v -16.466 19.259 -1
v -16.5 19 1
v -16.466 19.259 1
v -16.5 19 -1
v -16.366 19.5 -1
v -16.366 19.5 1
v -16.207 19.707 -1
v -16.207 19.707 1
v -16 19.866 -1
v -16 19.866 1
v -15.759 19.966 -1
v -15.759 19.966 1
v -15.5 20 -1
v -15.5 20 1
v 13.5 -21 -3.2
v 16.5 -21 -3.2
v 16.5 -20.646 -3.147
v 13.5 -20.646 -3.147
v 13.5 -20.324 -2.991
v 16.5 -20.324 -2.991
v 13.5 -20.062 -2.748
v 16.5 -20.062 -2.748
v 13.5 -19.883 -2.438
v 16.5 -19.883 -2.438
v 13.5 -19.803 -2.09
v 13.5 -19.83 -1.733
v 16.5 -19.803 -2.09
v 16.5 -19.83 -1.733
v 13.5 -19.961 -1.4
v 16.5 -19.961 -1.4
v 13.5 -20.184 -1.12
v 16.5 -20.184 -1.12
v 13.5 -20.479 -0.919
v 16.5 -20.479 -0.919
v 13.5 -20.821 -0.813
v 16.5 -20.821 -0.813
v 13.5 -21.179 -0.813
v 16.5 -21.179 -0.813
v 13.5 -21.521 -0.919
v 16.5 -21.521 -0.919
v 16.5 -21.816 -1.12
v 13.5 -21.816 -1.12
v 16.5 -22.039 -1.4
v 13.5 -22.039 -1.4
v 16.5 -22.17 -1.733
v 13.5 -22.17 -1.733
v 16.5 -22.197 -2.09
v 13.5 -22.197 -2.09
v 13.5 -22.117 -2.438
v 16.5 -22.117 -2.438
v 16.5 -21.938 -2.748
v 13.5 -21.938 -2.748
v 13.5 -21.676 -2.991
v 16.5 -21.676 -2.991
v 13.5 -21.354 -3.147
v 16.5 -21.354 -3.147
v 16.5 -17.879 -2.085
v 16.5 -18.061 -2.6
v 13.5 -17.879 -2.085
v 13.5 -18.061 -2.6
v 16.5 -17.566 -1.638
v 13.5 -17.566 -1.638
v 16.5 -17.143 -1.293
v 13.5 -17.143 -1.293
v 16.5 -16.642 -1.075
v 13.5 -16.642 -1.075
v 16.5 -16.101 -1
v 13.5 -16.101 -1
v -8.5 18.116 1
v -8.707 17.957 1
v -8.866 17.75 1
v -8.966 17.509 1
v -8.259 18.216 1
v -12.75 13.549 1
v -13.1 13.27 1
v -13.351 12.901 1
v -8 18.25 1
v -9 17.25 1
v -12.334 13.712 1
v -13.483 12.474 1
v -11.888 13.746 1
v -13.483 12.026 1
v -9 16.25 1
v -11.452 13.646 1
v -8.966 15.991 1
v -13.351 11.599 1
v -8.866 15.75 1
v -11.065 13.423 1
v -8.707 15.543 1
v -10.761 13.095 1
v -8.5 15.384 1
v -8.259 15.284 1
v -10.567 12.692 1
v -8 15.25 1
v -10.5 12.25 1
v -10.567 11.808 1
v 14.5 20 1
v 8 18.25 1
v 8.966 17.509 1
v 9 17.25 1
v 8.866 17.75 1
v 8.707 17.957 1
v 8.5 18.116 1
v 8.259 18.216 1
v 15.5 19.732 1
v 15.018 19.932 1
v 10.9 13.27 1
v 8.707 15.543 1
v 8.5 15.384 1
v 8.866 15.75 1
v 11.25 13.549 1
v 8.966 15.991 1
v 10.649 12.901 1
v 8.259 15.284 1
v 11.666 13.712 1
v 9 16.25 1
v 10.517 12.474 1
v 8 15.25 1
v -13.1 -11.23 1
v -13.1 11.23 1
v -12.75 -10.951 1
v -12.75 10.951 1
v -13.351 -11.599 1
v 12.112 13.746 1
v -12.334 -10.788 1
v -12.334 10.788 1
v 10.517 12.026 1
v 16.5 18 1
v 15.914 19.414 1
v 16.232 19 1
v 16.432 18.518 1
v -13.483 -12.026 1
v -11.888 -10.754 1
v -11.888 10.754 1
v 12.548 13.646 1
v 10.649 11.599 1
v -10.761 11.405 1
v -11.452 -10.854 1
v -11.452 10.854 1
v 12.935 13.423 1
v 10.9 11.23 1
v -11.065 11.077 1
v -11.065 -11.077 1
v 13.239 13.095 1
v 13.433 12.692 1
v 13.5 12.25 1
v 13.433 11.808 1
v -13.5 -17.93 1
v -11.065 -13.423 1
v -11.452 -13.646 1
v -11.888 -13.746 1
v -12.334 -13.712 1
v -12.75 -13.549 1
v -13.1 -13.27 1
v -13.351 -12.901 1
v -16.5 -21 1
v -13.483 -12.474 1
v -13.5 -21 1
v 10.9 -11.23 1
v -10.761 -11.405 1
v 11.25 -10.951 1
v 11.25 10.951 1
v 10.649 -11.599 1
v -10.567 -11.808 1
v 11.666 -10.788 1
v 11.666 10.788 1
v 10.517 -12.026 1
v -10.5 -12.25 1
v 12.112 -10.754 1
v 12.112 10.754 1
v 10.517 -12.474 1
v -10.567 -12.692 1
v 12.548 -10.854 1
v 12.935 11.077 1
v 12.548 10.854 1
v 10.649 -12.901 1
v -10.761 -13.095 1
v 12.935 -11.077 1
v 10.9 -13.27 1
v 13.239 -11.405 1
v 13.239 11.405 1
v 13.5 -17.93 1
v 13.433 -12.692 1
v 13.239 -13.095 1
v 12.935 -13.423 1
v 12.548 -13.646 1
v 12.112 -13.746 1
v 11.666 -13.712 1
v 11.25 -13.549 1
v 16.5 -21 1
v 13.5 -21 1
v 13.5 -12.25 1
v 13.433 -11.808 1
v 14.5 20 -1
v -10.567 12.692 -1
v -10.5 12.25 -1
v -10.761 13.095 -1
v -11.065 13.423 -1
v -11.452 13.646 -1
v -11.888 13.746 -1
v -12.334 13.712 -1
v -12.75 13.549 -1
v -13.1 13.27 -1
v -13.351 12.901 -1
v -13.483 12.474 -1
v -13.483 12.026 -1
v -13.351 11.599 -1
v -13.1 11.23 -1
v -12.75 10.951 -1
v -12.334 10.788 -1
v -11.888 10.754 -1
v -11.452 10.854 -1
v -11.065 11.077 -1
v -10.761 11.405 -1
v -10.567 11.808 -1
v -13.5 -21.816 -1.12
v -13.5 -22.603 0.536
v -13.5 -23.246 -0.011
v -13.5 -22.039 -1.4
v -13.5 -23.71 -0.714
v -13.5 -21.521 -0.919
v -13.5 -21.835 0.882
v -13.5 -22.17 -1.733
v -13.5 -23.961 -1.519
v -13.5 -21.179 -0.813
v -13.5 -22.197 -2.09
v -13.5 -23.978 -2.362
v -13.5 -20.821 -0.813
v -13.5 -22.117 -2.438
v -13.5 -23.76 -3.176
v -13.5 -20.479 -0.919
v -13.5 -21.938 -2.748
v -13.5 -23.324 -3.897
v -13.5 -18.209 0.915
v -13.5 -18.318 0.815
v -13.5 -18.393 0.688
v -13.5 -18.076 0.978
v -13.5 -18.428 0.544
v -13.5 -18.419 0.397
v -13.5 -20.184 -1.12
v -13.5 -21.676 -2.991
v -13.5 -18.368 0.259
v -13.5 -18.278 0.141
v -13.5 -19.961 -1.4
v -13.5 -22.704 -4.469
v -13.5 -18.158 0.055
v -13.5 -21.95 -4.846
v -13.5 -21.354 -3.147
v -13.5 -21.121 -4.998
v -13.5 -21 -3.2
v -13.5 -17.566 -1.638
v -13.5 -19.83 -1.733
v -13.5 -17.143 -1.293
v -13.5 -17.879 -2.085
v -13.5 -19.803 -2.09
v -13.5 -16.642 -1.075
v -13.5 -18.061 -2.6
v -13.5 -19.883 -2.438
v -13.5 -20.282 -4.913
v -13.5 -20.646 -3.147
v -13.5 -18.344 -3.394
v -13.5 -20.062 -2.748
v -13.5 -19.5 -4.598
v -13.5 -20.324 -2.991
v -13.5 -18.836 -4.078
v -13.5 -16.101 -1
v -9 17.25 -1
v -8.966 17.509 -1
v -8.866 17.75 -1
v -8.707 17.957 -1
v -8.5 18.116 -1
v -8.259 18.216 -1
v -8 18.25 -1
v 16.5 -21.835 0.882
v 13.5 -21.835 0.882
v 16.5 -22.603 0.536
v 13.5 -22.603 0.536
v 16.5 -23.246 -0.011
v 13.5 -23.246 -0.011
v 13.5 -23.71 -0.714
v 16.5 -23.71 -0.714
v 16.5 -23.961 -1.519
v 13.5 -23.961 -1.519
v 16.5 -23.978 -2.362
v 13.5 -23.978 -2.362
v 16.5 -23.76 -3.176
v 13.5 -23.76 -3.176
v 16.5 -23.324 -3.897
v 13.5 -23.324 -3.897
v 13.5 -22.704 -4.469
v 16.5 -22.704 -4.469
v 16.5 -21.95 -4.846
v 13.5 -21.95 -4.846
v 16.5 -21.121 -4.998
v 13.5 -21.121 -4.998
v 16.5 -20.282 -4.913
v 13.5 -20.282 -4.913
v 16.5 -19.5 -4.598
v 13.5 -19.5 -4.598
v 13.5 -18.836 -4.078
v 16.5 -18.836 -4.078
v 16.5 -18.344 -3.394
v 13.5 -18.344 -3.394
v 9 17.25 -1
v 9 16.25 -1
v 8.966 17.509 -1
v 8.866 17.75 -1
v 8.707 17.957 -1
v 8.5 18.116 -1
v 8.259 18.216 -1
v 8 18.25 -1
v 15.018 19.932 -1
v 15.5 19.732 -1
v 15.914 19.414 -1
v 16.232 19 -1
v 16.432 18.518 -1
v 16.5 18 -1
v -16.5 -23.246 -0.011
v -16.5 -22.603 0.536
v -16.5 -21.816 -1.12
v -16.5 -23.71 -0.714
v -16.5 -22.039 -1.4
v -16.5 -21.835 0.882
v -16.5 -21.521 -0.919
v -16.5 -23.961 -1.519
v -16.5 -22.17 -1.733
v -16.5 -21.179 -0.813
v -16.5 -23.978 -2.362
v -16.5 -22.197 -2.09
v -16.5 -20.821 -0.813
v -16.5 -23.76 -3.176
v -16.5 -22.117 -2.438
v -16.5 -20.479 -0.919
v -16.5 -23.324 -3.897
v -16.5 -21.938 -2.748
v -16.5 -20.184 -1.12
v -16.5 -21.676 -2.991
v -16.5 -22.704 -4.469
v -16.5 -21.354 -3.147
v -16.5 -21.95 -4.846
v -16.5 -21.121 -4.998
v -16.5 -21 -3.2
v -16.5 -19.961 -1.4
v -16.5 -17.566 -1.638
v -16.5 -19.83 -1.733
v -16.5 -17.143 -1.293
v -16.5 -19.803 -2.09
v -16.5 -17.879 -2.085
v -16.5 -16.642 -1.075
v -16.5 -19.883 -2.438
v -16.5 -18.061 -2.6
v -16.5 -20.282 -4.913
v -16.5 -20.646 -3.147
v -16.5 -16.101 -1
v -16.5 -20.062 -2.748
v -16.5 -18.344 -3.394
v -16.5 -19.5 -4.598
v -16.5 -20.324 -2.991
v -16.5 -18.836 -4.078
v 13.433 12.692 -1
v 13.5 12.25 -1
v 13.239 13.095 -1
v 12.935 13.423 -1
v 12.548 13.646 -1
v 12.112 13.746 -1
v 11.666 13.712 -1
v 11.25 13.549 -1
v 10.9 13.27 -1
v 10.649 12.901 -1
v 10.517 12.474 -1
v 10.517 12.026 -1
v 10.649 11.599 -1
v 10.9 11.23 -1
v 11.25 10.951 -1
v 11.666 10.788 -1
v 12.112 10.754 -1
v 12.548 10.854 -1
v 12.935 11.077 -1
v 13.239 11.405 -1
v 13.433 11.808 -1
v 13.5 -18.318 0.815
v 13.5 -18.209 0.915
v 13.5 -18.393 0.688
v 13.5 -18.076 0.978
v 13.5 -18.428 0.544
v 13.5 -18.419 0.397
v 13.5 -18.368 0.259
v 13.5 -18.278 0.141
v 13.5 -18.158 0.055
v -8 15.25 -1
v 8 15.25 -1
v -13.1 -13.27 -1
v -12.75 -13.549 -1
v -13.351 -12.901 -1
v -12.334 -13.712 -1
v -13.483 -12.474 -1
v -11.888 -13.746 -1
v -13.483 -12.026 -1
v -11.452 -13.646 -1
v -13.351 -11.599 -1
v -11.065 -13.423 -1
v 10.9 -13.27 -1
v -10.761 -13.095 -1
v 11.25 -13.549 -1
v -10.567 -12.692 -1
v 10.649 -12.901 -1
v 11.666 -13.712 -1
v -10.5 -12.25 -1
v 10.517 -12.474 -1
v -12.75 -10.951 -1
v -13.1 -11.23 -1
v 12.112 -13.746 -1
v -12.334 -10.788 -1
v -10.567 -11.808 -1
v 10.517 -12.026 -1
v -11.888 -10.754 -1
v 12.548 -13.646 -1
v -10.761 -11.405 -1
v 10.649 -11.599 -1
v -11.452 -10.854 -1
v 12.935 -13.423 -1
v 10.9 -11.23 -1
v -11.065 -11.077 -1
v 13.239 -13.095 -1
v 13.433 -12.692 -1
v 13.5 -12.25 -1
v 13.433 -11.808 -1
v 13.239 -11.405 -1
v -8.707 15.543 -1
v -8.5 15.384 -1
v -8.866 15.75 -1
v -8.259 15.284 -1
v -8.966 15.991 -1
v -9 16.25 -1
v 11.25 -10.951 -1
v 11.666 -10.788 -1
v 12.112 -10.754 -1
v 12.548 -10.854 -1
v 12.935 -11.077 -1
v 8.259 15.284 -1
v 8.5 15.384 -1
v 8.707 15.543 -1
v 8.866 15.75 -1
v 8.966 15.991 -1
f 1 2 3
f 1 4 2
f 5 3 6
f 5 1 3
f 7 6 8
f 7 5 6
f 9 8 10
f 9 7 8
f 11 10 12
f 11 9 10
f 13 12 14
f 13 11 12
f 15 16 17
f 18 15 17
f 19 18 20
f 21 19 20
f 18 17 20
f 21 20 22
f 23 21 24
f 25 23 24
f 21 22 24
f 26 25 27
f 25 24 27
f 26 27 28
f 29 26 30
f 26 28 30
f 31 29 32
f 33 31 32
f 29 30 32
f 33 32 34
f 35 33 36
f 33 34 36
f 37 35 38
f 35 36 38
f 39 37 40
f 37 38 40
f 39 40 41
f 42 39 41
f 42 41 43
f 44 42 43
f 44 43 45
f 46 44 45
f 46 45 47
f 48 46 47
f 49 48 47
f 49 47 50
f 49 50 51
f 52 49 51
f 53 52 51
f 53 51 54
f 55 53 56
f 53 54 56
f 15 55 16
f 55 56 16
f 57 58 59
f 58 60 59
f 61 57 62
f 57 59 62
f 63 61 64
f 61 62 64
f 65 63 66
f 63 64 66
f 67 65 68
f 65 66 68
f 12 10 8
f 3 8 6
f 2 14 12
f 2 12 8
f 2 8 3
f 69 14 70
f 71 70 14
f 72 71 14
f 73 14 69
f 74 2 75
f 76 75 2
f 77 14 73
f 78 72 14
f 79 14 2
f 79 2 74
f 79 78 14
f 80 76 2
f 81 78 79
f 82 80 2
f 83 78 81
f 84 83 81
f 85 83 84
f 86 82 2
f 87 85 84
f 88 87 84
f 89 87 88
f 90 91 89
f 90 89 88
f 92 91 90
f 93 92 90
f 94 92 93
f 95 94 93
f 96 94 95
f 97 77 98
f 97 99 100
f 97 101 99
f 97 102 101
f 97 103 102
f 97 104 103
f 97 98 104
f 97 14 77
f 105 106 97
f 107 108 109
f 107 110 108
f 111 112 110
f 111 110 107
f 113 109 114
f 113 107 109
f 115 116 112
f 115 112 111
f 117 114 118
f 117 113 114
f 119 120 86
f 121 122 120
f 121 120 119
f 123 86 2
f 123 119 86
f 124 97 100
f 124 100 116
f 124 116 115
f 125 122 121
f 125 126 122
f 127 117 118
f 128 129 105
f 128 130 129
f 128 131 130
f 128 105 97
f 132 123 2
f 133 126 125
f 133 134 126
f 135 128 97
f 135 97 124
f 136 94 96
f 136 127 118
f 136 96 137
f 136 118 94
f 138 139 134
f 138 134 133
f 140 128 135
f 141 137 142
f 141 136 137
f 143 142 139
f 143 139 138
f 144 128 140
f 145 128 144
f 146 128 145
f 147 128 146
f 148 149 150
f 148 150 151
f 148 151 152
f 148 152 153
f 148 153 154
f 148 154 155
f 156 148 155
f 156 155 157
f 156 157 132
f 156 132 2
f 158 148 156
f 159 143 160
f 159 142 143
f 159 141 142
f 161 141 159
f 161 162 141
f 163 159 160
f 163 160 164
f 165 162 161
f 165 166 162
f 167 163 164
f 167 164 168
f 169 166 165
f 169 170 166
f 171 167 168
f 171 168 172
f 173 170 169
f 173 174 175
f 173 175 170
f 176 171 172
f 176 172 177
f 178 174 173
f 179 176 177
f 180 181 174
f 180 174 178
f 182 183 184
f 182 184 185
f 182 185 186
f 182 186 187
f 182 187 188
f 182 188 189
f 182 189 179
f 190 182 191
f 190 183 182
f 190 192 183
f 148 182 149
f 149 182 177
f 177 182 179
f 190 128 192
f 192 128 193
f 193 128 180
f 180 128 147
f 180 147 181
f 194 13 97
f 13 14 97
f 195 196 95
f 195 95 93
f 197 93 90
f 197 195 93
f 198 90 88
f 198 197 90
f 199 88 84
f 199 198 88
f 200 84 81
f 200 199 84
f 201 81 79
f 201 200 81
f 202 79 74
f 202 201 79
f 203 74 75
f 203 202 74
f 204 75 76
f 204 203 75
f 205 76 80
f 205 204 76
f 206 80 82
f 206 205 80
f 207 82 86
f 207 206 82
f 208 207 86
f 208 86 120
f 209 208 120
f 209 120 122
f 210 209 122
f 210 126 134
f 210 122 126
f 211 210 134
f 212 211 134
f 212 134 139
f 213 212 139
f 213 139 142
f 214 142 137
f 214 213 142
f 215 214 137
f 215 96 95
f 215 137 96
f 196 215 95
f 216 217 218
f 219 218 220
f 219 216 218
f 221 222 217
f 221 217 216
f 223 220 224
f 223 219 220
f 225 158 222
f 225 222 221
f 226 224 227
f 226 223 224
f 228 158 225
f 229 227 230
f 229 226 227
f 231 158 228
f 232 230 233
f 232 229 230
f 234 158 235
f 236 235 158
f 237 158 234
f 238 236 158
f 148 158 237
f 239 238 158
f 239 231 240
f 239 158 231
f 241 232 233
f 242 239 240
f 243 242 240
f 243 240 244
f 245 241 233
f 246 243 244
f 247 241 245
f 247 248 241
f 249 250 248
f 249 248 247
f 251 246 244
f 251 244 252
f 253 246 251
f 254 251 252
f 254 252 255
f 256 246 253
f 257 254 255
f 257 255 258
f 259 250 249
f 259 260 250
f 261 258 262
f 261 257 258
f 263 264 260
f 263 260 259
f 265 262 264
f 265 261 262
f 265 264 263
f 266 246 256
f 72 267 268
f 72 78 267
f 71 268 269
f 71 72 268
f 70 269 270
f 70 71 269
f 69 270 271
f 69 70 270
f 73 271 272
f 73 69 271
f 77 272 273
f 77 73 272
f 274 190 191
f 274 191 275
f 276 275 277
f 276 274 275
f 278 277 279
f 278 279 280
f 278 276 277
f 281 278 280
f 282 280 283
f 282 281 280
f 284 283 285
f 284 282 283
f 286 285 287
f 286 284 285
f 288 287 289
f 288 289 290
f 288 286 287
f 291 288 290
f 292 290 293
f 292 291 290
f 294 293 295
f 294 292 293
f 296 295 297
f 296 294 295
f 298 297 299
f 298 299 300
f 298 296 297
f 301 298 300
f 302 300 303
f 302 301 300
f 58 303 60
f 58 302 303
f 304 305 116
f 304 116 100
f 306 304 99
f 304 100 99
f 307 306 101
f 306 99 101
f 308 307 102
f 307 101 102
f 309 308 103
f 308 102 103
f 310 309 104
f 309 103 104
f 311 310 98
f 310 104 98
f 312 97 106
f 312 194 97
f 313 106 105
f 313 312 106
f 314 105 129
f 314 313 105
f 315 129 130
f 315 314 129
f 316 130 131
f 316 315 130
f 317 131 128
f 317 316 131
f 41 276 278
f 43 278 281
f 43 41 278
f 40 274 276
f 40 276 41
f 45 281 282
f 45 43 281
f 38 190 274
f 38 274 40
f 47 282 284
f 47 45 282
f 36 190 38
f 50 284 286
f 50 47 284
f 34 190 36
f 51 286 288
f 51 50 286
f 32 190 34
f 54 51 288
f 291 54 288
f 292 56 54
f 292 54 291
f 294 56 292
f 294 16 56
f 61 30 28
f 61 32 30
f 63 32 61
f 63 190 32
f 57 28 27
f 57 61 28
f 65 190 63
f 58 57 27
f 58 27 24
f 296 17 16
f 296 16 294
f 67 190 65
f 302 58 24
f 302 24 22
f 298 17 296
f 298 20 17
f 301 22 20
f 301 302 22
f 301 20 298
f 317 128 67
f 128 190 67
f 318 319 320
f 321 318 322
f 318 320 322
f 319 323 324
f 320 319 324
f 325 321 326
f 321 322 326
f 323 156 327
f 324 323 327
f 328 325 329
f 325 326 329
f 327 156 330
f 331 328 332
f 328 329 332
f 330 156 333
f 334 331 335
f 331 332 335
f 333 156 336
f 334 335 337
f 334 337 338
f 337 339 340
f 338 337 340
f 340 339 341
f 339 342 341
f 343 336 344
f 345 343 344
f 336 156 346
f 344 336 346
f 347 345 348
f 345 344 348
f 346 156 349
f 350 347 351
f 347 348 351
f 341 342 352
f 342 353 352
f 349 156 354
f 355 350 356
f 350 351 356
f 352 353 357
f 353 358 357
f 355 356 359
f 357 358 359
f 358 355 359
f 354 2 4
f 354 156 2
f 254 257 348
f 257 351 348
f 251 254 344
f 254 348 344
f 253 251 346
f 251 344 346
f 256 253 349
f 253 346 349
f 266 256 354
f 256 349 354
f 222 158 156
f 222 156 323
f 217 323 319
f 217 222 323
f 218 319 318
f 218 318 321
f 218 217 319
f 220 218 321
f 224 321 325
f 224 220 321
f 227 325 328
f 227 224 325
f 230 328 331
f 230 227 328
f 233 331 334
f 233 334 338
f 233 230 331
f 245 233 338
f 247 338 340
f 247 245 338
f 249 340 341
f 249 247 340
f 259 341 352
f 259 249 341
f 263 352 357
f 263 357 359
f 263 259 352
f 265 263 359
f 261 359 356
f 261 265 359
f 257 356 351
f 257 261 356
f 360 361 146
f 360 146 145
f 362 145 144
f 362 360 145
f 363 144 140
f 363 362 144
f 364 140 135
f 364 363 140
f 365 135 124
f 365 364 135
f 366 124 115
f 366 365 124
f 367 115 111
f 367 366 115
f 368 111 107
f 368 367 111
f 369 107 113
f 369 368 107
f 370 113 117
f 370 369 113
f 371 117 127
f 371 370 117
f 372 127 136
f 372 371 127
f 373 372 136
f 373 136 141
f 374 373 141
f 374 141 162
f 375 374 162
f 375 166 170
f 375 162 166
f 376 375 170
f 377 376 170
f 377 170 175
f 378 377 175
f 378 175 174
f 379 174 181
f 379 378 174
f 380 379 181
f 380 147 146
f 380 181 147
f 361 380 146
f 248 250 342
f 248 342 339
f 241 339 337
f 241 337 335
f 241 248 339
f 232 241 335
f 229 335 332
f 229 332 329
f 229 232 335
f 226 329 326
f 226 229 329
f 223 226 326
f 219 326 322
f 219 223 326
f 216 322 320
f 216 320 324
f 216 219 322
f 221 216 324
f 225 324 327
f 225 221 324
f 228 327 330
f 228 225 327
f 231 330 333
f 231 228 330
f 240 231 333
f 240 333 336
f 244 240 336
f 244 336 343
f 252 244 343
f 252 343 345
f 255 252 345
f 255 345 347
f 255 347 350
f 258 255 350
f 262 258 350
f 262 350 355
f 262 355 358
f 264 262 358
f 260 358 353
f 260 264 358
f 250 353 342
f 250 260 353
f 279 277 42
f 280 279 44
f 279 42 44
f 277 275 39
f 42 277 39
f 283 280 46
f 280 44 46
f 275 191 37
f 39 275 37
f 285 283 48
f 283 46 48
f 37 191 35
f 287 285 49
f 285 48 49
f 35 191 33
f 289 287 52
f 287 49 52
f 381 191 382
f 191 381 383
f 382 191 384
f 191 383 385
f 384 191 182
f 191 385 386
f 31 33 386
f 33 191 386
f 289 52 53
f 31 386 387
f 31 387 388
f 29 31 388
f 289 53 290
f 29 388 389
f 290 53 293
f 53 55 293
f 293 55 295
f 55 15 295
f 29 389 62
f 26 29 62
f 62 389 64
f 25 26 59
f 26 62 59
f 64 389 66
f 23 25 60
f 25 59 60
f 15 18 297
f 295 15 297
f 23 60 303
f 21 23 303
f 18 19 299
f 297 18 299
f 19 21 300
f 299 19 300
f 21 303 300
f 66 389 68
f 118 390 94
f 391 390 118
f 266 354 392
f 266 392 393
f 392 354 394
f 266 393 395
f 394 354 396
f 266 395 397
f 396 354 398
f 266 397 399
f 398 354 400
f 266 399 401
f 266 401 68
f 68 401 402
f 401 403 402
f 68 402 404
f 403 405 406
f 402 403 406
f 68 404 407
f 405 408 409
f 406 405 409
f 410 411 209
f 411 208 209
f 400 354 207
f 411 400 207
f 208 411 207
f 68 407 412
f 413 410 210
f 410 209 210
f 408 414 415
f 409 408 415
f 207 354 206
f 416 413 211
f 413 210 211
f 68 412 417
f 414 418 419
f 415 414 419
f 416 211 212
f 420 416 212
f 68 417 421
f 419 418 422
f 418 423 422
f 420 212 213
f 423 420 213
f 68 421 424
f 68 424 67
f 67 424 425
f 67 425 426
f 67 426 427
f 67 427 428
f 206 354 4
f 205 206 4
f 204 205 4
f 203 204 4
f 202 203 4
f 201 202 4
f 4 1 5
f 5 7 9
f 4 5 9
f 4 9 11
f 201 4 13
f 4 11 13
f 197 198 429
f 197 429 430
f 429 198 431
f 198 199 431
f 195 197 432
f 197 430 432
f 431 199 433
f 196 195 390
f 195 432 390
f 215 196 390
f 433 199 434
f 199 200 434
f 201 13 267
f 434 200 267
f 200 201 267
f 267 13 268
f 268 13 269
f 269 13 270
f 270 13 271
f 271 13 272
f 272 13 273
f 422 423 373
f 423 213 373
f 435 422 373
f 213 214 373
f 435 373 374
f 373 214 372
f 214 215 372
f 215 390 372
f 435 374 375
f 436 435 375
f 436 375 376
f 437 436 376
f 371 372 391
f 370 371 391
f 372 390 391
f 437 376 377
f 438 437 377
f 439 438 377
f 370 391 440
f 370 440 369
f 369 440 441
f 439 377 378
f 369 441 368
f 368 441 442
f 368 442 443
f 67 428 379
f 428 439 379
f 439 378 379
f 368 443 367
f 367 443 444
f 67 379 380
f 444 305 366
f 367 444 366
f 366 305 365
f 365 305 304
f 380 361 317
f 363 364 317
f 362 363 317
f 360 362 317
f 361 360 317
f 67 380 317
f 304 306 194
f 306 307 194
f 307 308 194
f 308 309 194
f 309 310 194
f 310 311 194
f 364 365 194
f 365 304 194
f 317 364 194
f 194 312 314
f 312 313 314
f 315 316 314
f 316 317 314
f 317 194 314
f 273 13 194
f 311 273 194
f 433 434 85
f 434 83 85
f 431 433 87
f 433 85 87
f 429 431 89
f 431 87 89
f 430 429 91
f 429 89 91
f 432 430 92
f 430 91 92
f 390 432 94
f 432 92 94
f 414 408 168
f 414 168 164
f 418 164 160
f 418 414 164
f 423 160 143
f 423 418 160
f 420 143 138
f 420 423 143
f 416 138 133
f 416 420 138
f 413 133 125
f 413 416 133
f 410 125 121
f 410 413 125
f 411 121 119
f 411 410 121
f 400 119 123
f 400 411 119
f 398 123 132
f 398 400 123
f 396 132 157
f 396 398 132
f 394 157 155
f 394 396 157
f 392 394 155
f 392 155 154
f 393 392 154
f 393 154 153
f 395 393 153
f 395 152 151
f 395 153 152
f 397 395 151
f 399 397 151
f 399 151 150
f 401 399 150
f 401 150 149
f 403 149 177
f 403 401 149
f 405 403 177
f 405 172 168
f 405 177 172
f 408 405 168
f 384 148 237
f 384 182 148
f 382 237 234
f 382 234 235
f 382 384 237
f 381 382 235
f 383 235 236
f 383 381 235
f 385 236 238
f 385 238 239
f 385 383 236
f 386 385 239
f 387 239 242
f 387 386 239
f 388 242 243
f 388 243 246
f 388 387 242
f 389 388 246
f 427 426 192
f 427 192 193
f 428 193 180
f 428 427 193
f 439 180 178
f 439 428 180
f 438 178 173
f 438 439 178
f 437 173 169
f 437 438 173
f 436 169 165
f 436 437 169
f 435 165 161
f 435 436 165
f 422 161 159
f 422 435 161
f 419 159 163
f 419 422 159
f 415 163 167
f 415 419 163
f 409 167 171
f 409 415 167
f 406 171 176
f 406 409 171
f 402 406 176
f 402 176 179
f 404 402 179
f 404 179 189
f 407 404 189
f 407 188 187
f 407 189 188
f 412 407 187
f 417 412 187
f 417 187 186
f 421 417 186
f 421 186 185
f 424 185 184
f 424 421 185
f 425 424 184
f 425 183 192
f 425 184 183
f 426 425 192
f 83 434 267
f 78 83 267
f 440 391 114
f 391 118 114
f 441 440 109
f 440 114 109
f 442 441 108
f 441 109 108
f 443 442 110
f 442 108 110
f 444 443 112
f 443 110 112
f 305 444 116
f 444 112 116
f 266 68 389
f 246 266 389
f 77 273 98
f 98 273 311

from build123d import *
from OCP.BRepFilletAPI import BRepFilletAPI_MakeFillet

# Parameters (mm, degrees)
SKETCH1_W               = 33
SKETCH1_H               = 40
BOSS_EXTRUDE1_DEPTH     = 1
SKETCH3_R               = 1.2
BOSS_EXTRUDE2_DEPTH     = 3
BOSS_EXTRUDE3_START     = -3
SKETCH4_R               = 1.2
BOSS_EXTRUDE3_DEPTH     = 3
CUT_EXTRUDE1_DEPTH      = 30.550803712
CUT_EXTRUDE1_DEPTH_BACK = 30.550803712
SKETCH6_R               = 1.5
SKETCH6_W               = 18
SKETCH6_H               = 3
FILLET4_R1              = 2
FILLET4_R2              = 1
CUT_EXTRUDE2_DEPTH      = 27
FILLET5_R               = 0.5


with BuildPart() as part:
    # Sketch1 → Boss-Extrude1 (new, symmetric)
    with BuildSketch(Plane.XY):
        Rectangle(SKETCH1_W, SKETCH1_H)
    extrude(amount=BOSS_EXTRUDE1_DEPTH, both=True)

    # Sketch3 → Boss-Extrude2 (add)
    with BuildSketch(Plane(origin=(16.5, 0, 0), x_dir=(0, 0, -1), z_dir=(1, 0, 0))):
        with BuildLine():
            Line((-1, -20), (-1, -21))
            ThreePointArc((-1, -21), (4.449489743, -22.732050808), (1, -18.171572875))
            Line((1, -18.171572875), (-1, -20))
        make_face()
        with Locations((2, -21)):
            Circle(SKETCH3_R, mode=Mode.SUBTRACT)
    extrude(amount=-BOSS_EXTRUDE2_DEPTH)

    # Sketch4 → Boss-Extrude3 (add)
    with BuildSketch(Plane.ZY.offset(16.5).offset(BOSS_EXTRUDE3_START)):
        with BuildLine():
            Line((1, -20), (1, -21))
            ThreePointArc((1, -21), (-4.449489743, -22.732050808), (-1, -18.171572875))
            Line((-1, -18.171572875), (1, -20))
        make_face()
        with Locations(Location((-2, -21, 0), (0, 0, 180))):
            Circle(SKETCH4_R, mode=Mode.SUBTRACT)
    extrude(amount=BOSS_EXTRUDE3_DEPTH)

    # Sketch6 → Cut-Extrude1 (cut, two sides: drawn at the far end of the back side and taken through both)
    with BuildSketch(Plane.XY.offset(-CUT_EXTRUDE1_DEPTH_BACK)):
        with Locations((-12, 12.25)):
            Circle(SKETCH6_R)
        with Locations((12, 12.25)):
            Circle(SKETCH6_R)
        with Locations((12, -12.25)):
            Circle(SKETCH6_R)
        with Locations((-12, -12.25)):
            Circle(SKETCH6_R)
        with Locations((0, 16.75)):
            Rectangle(SKETCH6_W, SKETCH6_H)
    extrude(amount=CUT_EXTRUDE1_DEPTH + CUT_EXTRUDE1_DEPTH_BACK, mode=Mode.SUBTRACT)

    # Fillet4: one fillet with a radius per group of edges: ONE call of the kernel's fillet builder (fillet() takes one radius for all edges)
    fillet4_edges_1 = [part.edges().sort_by_distance(p)[0] for p in [
        (16.5, 20, 0),
        (15, -18.171572875, -1),
        (-15, -18.171572875, -1),
    ]]
    fillet4_edges_2 = [part.edges().sort_by_distance(p)[0] for p in [
        (-16.5, 20, 0),
        (-9, 18.25, 0),
        (-9, 15.25, 0),
        (9, 18.25, 0),
        (9, 15.25, 0),
    ]]
    fillet4 = BRepFilletAPI_MakeFillet(part.part.solid().wrapped)
    for e in fillet4_edges_1:
        fillet4.Add(FILLET4_R1, e.wrapped)
    for e in fillet4_edges_2:
        fillet4.Add(FILLET4_R2, e.wrapped)
    add(Compound.cast(fillet4.Shape()), mode=Mode.REPLACE)

    # Sketch8 → Cut-Extrude2 (cut)
    with BuildSketch(Plane.ZY.offset(-13.5)):
        Polygon((-1, -16.101020514), (1, -20), (-1, -20), align=None)
    extrude(amount=CUT_EXTRUDE2_DEPTH, mode=Mode.SUBTRACT)

    # Fillet5
    fillet5_edges = [part.edges().sort_by_distance(p)[0] for p in [
        (0, -20, 1),
    ]]
    fillet(fillet5_edges, radius=FILLET5_R)


solid = part.part
